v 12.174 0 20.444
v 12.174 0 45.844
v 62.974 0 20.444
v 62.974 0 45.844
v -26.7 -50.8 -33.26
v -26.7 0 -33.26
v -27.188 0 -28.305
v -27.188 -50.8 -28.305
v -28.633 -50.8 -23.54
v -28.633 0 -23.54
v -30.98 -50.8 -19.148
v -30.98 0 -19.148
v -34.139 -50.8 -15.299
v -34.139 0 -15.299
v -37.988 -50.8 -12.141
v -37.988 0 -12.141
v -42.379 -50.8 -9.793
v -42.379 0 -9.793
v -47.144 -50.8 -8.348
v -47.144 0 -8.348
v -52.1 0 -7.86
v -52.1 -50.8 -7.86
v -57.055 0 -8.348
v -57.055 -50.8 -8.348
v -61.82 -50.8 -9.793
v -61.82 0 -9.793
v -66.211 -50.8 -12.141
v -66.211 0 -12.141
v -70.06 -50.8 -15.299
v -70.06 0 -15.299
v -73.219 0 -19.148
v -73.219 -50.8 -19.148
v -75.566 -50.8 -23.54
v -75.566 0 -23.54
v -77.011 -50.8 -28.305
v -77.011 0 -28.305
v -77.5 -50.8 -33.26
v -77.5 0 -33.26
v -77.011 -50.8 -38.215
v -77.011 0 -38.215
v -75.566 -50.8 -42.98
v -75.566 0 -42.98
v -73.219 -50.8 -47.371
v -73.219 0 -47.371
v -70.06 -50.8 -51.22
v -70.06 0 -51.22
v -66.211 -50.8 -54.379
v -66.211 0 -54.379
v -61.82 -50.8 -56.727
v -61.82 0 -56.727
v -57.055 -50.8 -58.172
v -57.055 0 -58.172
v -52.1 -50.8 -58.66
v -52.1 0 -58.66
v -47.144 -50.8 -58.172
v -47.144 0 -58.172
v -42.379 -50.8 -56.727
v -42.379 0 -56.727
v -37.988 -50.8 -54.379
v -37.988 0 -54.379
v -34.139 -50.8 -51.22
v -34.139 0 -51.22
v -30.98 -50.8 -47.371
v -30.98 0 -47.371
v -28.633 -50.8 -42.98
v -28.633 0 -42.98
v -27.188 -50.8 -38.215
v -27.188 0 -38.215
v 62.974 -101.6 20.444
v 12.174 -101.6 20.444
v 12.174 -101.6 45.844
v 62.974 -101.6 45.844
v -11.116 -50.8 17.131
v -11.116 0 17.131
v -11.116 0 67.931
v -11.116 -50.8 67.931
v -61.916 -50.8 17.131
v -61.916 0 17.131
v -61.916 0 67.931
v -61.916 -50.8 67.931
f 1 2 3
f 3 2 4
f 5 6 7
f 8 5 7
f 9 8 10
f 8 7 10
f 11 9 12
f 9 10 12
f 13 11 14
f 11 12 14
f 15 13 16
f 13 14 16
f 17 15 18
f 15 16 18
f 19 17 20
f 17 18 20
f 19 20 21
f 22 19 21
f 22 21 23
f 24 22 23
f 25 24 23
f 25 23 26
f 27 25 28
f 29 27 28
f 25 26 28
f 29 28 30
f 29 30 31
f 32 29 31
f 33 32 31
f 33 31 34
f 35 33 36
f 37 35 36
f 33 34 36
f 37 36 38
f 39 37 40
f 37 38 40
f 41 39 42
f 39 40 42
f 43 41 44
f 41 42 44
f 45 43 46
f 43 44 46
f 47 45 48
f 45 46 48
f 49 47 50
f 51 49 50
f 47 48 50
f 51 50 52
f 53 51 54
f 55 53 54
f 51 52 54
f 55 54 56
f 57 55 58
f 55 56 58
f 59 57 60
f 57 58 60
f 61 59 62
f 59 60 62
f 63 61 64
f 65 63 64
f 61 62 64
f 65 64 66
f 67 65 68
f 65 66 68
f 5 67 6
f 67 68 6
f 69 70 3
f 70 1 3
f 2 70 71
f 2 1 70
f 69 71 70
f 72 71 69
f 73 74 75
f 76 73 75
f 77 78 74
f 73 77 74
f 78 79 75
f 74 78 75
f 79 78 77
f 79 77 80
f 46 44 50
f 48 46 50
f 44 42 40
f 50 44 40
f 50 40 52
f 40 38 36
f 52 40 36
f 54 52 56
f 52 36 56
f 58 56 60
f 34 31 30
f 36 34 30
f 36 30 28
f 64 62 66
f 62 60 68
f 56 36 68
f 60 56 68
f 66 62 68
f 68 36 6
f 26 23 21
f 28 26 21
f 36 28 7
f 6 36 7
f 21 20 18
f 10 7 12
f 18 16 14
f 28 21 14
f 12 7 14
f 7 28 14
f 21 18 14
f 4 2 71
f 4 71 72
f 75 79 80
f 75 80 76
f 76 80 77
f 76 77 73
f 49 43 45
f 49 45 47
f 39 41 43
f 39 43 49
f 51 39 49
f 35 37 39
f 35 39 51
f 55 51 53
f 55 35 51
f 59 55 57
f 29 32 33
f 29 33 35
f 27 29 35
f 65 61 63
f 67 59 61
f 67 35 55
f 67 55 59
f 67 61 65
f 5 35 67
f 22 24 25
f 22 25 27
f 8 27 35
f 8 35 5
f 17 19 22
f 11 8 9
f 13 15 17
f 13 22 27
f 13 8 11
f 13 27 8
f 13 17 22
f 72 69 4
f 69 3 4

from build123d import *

# Parameters (mm, degrees)
F0_W      = 50.8
F0_H      = 50.8
F3_DEPTH  = 50.8
F1_W      = 50.8
F1_H      = 25.4
F4_DEPTH  = 50.8
F4_FACE_W = 50.8
F4_FACE_H = 25.4
F2_R      = 25.4
F5_DEPTH  = 50.8


with BuildPart() as f3:
    # F0 (on Front) → F3 (new body)
    with BuildSketch(Plane.XZ):
        with Locations((-36.51619, 42.530892)):
            Rectangle(F0_W, F0_H)
    extrude(amount=F3_DEPTH)


with BuildPart() as f4:
    # F1 (on Front) → F4 (new body)
    with BuildSketch(Plane.XZ):
        with Locations((37.573572, 33.14368)):
            Rectangle(F1_W, F1_H)
    extrude(amount=F4_DEPTH)

    # F4_face (on face) + F2 (on Front) → F5 (join)
    with BuildSketch(Plane(origin=(37.573572, -50.8, 33.14368), x_dir=(1, 0, 0), z_dir=(0, -1, 0))):
        Rectangle(F4_FACE_W, F4_FACE_H)
    with BuildSketch(Plane.XZ):
        with Locations((-52.099537, -33.259969)):
            Circle(F2_R)
    extrude(amount=F5_DEPTH)


solid = Compound([f3.part, f4.part])
